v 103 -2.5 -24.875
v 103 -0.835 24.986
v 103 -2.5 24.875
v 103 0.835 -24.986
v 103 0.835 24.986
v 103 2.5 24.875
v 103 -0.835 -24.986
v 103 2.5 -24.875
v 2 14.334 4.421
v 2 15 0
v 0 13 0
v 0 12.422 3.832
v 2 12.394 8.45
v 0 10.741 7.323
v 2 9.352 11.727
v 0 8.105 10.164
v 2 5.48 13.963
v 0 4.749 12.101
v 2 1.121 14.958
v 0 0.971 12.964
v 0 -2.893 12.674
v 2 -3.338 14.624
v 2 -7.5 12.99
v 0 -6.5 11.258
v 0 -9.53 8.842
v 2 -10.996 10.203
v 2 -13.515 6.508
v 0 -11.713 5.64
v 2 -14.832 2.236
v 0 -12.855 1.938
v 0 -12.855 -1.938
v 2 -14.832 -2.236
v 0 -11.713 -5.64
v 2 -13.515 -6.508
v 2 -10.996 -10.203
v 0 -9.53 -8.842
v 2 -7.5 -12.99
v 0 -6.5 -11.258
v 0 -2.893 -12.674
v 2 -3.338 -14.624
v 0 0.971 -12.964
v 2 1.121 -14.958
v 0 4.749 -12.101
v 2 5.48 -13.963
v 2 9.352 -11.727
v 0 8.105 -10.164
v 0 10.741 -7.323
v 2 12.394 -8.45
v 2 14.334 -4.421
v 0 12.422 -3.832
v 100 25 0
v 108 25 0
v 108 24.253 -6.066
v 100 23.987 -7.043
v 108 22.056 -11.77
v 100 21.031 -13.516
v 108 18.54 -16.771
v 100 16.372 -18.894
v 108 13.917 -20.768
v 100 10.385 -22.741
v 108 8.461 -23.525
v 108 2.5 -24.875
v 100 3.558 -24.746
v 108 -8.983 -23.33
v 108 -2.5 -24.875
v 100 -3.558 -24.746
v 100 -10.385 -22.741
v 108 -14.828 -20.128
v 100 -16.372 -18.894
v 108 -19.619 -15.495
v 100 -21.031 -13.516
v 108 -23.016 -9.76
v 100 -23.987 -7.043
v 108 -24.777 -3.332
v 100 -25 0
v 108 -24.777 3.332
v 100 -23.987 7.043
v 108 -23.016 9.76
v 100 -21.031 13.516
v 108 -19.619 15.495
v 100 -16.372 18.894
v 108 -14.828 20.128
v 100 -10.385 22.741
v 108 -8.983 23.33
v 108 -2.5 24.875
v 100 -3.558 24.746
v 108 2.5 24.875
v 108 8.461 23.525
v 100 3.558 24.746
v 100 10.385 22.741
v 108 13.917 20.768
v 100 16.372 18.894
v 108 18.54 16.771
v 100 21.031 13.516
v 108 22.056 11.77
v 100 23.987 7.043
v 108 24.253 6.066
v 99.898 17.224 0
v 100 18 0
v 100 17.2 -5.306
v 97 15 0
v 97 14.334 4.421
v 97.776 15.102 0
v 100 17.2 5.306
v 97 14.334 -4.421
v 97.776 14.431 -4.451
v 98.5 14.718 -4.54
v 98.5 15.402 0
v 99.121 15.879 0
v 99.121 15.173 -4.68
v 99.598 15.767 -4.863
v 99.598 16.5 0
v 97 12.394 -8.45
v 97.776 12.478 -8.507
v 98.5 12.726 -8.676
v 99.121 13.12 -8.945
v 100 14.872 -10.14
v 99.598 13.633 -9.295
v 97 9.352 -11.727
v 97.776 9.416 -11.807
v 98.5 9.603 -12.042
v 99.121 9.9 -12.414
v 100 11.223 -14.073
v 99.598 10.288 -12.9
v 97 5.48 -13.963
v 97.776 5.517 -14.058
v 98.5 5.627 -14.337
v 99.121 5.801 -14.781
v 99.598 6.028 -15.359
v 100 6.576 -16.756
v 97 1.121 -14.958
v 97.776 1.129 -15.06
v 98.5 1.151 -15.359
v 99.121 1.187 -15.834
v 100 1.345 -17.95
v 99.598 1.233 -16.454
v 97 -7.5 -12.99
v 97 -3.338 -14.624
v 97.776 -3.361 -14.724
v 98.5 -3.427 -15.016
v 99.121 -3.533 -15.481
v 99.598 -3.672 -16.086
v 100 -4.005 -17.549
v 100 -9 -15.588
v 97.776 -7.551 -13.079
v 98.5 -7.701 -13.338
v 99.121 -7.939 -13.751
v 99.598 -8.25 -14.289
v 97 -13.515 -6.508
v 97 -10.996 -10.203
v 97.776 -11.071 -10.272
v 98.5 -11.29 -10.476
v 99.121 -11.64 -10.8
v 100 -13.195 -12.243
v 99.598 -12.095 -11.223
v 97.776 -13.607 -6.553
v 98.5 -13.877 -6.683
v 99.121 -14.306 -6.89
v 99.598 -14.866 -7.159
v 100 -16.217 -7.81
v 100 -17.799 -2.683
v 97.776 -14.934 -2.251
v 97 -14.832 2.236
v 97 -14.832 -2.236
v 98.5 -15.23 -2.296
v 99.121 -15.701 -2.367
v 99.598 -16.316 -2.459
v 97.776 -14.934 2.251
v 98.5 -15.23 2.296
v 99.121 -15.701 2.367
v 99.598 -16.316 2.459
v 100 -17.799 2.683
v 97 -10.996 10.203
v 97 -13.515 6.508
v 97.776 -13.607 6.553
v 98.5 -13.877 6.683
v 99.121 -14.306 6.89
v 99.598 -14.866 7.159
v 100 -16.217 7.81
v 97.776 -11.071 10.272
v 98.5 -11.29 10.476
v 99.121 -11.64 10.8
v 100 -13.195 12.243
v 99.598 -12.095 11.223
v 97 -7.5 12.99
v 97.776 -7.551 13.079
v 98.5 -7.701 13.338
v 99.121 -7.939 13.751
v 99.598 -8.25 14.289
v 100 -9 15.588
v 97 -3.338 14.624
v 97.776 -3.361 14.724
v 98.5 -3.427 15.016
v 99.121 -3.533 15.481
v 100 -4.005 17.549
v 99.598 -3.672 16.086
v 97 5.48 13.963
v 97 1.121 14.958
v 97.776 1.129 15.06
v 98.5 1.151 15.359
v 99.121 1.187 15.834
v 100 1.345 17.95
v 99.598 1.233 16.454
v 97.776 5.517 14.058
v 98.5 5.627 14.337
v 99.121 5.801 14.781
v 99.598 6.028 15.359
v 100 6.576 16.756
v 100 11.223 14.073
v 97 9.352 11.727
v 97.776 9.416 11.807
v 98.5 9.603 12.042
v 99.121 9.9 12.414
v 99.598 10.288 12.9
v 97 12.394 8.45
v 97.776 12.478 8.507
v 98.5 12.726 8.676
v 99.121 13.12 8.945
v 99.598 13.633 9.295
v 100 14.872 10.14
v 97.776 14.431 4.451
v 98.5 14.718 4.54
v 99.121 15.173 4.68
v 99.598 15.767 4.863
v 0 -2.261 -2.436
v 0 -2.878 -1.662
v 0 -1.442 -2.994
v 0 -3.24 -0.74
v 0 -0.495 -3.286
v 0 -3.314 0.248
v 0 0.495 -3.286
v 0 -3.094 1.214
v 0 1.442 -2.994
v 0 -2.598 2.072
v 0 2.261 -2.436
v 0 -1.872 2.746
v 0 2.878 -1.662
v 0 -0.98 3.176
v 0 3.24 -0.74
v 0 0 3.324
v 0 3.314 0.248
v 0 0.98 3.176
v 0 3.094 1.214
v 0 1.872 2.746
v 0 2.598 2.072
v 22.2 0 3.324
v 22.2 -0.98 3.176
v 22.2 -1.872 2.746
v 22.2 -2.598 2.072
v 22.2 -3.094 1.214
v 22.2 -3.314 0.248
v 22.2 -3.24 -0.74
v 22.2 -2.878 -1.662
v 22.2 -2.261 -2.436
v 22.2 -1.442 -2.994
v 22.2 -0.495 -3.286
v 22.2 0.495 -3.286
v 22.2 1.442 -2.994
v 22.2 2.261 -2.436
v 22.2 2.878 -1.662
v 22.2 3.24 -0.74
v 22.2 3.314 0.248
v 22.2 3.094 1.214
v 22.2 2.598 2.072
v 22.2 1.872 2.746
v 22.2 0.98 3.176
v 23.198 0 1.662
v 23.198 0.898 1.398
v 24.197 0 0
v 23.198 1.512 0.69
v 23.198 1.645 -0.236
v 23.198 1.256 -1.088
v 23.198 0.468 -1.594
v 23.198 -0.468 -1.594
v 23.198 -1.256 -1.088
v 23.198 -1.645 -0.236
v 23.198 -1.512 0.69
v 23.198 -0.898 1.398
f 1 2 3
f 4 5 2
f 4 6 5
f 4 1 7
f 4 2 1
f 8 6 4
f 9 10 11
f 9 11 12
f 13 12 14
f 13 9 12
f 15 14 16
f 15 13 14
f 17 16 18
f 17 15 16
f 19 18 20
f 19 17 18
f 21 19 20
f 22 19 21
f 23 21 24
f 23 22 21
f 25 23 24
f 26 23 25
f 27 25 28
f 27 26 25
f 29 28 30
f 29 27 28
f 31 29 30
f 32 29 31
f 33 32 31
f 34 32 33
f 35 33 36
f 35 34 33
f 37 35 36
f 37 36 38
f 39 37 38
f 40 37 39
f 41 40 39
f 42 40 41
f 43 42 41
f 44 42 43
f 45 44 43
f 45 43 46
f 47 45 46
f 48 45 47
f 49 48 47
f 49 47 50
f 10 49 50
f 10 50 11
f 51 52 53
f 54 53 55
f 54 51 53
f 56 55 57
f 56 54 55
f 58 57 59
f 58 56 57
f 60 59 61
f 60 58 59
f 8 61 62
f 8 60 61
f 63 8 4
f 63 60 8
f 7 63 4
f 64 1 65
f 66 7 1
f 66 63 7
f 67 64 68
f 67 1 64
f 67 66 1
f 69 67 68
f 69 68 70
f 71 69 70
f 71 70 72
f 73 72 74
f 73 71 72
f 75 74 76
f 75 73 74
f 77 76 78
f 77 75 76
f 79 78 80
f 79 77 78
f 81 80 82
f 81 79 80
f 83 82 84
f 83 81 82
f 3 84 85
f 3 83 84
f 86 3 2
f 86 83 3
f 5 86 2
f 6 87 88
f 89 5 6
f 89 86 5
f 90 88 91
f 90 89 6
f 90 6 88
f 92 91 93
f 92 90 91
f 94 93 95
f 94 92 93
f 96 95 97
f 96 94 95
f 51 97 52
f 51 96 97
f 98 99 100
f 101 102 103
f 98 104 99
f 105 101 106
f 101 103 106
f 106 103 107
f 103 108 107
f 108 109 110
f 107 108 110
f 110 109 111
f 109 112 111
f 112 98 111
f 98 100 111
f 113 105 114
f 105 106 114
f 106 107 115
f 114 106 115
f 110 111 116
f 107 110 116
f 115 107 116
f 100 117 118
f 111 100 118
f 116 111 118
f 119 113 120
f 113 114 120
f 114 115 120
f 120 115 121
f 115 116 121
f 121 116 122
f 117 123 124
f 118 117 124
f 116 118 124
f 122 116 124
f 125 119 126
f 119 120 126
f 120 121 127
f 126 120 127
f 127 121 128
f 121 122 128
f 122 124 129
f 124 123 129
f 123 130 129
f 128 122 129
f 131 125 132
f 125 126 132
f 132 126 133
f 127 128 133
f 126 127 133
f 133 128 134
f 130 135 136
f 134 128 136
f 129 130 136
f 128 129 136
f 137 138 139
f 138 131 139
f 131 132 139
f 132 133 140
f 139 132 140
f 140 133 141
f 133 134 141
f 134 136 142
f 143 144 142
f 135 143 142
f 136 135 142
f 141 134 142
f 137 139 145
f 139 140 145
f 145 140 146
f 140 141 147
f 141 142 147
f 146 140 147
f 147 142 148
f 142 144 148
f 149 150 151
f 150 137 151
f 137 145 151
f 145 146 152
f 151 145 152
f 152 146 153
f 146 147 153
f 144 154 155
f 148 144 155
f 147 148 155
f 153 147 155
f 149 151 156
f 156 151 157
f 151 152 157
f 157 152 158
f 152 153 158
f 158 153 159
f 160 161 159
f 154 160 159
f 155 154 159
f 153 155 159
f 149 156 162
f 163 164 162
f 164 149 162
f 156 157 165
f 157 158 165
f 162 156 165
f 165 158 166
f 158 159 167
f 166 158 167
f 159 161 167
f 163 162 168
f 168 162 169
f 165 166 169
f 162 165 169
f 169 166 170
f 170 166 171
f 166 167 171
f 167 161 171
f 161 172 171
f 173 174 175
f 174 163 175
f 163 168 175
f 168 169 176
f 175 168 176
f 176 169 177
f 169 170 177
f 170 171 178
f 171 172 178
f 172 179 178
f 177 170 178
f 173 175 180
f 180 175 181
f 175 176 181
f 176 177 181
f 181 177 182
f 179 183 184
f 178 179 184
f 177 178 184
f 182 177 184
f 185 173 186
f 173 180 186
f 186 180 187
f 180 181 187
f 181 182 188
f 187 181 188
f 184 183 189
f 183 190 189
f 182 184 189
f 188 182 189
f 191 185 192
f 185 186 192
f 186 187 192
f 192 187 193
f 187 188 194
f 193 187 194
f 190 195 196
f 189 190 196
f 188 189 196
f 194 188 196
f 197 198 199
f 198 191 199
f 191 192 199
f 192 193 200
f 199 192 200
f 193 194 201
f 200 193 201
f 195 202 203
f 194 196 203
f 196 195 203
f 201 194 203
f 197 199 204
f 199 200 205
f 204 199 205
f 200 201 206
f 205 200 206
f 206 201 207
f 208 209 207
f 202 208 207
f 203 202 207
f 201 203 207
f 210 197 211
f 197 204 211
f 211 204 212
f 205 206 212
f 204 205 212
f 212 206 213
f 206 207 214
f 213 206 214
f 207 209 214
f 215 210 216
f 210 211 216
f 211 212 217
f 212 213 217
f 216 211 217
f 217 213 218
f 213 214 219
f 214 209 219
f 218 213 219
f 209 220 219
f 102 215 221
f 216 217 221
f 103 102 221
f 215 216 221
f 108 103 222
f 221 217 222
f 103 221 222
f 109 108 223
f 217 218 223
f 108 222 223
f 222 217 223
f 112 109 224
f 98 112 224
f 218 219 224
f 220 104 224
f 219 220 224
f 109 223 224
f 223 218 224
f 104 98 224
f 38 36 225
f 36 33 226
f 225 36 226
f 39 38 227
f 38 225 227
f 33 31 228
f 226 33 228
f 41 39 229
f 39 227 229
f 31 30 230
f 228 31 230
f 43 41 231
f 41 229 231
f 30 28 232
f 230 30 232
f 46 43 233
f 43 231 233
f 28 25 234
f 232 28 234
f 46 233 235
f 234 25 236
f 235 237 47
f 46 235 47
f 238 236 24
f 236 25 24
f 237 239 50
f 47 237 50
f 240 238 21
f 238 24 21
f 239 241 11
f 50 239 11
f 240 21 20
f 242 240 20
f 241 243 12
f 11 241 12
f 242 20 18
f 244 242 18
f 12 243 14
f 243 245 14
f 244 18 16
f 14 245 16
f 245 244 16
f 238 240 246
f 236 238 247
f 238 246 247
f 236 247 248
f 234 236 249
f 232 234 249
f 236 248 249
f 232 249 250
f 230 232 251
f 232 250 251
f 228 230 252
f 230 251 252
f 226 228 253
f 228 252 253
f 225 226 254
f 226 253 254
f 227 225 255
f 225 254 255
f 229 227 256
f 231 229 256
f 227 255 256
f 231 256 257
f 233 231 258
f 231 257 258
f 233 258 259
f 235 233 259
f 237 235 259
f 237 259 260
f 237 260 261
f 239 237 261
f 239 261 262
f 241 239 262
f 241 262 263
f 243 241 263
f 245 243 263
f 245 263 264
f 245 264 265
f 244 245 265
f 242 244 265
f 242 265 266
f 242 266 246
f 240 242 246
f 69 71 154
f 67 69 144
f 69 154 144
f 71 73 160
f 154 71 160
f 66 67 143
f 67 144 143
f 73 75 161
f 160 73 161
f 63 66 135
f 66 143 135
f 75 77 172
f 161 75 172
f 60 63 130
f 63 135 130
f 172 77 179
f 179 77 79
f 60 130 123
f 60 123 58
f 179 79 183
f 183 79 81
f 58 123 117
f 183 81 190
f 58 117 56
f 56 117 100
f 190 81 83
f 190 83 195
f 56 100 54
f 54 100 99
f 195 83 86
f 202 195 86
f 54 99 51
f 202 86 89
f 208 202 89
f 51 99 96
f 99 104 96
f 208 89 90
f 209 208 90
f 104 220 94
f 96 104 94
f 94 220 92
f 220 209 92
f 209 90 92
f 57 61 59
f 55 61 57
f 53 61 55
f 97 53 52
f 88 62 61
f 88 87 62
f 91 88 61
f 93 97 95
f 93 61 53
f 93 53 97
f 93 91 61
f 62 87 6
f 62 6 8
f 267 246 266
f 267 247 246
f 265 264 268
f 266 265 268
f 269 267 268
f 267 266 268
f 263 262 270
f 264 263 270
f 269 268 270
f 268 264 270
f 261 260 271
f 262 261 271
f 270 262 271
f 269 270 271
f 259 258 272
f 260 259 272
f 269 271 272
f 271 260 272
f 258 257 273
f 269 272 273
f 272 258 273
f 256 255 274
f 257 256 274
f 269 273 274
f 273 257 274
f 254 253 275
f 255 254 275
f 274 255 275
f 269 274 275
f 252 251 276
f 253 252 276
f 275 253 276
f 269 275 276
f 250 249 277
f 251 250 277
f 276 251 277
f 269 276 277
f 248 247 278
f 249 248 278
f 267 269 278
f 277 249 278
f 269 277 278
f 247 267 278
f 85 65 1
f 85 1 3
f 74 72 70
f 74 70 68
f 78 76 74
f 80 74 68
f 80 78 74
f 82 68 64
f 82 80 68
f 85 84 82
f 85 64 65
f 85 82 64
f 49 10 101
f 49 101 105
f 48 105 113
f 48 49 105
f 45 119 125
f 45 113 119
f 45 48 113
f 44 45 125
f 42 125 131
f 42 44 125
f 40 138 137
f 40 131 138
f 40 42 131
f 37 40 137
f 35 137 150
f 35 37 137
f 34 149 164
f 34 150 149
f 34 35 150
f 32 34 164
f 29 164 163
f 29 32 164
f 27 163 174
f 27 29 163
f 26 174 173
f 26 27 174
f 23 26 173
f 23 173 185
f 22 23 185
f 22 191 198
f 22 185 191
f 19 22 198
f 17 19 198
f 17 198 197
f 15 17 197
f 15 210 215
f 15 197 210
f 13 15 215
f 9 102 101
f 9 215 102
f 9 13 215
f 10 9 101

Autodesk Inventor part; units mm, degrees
ref_plane "YZ Plane" through (0, 0, 0) normal (1, 0, 0) x (0, 1, 0)
ref_plane "XZ Plane" through (0, 0, 0) normal (0, 1, 0) x (-1, 0, 0)
ref_plane "XY Plane" through (0, 0, 0) normal (0, 0, 1) x (1, 0, 0)
sketch "Sketch1" plane through (0, 0, 0) normal (0, 0, 1) x (1, 0, 0)
  line L0 (0, 0) -> (100, 0)
  line L1 (100, 0) -> (100, 15)
  line L2 (100, 15) -> (0, 15)
  line L3 (0, 15) -> (0, 0)
  line L4 (100, 0) -> (108, 0)
  line L5 (108, 0) -> (108, 25)
  line L6 (108, 25) -> (100, 25)
  line L7 (100, 25) -> (100, 0)
  dimension "d0" = 15
  dimension "d1" = 25
  dimension "d2" = 100
  dimension "d3" = 8
revolve "Revolution1" add sketch "Sketch1" angle 360 about axis through (0, 0, 0) along (1, 0, 0)
fillet "Fillet1" radius 3 1 edges at (100, -15, 0)
chamfer "Chamfer1" distance 2 angle 45 1 edges at (0, -15, 0)
sketch "Sketch2" plane through (0, 0, 0) normal (-1, 0, 0) x (0, 0, 1)
  point P0 (0, 0)
  point P1 (0, 0)
hole "Hole1" at (0, 0, 0) direction (1, 0, 0) diameter 6.647 depth 22.2 tip angle 118 thread size "M8x1.25" class "6H" standard "ANSI Metric M Profile"
sketch "Sketch3" plane through (108, 0, 0) normal (1, 0, 0) x (0, 0, -1)
  line L0 (-25, 2.5) -> (25, 2.5)
  line L1 (25, 2.5) -> (25, -2.5)
  line L2 (25, -2.5) -> (-25, -2.5)
  line L3 (-25, -2.5) -> (-25, 2.5)
  circle A0 centre (0, 0) radius 18 projected
  circle A1 centre (0, 0) radius 25 projected
  dimension "d16" = 50
  dimension "d17" = 50
  dimension "d18" = 25
  dimension "d19" = 5
  dimension "d20" = 2.5
extrude "Extrusion1" cut sketch "Sketch3" against normal blind 5 contours L0 A1 L3 | L0 A0 L2 A1 | A1 L2 L3 | L0 A0 L2 | A1 L2 A0 L0 | L0 L1 A1 | L1 L2 A1
equation "\"d17\" = d16"
equation "\"d18\" = 0.5 * d17"
equation "\"d20\" = 0.5 * d19"
properties part number "Top_Hinge Cylinder" material "Stainless Steel"
